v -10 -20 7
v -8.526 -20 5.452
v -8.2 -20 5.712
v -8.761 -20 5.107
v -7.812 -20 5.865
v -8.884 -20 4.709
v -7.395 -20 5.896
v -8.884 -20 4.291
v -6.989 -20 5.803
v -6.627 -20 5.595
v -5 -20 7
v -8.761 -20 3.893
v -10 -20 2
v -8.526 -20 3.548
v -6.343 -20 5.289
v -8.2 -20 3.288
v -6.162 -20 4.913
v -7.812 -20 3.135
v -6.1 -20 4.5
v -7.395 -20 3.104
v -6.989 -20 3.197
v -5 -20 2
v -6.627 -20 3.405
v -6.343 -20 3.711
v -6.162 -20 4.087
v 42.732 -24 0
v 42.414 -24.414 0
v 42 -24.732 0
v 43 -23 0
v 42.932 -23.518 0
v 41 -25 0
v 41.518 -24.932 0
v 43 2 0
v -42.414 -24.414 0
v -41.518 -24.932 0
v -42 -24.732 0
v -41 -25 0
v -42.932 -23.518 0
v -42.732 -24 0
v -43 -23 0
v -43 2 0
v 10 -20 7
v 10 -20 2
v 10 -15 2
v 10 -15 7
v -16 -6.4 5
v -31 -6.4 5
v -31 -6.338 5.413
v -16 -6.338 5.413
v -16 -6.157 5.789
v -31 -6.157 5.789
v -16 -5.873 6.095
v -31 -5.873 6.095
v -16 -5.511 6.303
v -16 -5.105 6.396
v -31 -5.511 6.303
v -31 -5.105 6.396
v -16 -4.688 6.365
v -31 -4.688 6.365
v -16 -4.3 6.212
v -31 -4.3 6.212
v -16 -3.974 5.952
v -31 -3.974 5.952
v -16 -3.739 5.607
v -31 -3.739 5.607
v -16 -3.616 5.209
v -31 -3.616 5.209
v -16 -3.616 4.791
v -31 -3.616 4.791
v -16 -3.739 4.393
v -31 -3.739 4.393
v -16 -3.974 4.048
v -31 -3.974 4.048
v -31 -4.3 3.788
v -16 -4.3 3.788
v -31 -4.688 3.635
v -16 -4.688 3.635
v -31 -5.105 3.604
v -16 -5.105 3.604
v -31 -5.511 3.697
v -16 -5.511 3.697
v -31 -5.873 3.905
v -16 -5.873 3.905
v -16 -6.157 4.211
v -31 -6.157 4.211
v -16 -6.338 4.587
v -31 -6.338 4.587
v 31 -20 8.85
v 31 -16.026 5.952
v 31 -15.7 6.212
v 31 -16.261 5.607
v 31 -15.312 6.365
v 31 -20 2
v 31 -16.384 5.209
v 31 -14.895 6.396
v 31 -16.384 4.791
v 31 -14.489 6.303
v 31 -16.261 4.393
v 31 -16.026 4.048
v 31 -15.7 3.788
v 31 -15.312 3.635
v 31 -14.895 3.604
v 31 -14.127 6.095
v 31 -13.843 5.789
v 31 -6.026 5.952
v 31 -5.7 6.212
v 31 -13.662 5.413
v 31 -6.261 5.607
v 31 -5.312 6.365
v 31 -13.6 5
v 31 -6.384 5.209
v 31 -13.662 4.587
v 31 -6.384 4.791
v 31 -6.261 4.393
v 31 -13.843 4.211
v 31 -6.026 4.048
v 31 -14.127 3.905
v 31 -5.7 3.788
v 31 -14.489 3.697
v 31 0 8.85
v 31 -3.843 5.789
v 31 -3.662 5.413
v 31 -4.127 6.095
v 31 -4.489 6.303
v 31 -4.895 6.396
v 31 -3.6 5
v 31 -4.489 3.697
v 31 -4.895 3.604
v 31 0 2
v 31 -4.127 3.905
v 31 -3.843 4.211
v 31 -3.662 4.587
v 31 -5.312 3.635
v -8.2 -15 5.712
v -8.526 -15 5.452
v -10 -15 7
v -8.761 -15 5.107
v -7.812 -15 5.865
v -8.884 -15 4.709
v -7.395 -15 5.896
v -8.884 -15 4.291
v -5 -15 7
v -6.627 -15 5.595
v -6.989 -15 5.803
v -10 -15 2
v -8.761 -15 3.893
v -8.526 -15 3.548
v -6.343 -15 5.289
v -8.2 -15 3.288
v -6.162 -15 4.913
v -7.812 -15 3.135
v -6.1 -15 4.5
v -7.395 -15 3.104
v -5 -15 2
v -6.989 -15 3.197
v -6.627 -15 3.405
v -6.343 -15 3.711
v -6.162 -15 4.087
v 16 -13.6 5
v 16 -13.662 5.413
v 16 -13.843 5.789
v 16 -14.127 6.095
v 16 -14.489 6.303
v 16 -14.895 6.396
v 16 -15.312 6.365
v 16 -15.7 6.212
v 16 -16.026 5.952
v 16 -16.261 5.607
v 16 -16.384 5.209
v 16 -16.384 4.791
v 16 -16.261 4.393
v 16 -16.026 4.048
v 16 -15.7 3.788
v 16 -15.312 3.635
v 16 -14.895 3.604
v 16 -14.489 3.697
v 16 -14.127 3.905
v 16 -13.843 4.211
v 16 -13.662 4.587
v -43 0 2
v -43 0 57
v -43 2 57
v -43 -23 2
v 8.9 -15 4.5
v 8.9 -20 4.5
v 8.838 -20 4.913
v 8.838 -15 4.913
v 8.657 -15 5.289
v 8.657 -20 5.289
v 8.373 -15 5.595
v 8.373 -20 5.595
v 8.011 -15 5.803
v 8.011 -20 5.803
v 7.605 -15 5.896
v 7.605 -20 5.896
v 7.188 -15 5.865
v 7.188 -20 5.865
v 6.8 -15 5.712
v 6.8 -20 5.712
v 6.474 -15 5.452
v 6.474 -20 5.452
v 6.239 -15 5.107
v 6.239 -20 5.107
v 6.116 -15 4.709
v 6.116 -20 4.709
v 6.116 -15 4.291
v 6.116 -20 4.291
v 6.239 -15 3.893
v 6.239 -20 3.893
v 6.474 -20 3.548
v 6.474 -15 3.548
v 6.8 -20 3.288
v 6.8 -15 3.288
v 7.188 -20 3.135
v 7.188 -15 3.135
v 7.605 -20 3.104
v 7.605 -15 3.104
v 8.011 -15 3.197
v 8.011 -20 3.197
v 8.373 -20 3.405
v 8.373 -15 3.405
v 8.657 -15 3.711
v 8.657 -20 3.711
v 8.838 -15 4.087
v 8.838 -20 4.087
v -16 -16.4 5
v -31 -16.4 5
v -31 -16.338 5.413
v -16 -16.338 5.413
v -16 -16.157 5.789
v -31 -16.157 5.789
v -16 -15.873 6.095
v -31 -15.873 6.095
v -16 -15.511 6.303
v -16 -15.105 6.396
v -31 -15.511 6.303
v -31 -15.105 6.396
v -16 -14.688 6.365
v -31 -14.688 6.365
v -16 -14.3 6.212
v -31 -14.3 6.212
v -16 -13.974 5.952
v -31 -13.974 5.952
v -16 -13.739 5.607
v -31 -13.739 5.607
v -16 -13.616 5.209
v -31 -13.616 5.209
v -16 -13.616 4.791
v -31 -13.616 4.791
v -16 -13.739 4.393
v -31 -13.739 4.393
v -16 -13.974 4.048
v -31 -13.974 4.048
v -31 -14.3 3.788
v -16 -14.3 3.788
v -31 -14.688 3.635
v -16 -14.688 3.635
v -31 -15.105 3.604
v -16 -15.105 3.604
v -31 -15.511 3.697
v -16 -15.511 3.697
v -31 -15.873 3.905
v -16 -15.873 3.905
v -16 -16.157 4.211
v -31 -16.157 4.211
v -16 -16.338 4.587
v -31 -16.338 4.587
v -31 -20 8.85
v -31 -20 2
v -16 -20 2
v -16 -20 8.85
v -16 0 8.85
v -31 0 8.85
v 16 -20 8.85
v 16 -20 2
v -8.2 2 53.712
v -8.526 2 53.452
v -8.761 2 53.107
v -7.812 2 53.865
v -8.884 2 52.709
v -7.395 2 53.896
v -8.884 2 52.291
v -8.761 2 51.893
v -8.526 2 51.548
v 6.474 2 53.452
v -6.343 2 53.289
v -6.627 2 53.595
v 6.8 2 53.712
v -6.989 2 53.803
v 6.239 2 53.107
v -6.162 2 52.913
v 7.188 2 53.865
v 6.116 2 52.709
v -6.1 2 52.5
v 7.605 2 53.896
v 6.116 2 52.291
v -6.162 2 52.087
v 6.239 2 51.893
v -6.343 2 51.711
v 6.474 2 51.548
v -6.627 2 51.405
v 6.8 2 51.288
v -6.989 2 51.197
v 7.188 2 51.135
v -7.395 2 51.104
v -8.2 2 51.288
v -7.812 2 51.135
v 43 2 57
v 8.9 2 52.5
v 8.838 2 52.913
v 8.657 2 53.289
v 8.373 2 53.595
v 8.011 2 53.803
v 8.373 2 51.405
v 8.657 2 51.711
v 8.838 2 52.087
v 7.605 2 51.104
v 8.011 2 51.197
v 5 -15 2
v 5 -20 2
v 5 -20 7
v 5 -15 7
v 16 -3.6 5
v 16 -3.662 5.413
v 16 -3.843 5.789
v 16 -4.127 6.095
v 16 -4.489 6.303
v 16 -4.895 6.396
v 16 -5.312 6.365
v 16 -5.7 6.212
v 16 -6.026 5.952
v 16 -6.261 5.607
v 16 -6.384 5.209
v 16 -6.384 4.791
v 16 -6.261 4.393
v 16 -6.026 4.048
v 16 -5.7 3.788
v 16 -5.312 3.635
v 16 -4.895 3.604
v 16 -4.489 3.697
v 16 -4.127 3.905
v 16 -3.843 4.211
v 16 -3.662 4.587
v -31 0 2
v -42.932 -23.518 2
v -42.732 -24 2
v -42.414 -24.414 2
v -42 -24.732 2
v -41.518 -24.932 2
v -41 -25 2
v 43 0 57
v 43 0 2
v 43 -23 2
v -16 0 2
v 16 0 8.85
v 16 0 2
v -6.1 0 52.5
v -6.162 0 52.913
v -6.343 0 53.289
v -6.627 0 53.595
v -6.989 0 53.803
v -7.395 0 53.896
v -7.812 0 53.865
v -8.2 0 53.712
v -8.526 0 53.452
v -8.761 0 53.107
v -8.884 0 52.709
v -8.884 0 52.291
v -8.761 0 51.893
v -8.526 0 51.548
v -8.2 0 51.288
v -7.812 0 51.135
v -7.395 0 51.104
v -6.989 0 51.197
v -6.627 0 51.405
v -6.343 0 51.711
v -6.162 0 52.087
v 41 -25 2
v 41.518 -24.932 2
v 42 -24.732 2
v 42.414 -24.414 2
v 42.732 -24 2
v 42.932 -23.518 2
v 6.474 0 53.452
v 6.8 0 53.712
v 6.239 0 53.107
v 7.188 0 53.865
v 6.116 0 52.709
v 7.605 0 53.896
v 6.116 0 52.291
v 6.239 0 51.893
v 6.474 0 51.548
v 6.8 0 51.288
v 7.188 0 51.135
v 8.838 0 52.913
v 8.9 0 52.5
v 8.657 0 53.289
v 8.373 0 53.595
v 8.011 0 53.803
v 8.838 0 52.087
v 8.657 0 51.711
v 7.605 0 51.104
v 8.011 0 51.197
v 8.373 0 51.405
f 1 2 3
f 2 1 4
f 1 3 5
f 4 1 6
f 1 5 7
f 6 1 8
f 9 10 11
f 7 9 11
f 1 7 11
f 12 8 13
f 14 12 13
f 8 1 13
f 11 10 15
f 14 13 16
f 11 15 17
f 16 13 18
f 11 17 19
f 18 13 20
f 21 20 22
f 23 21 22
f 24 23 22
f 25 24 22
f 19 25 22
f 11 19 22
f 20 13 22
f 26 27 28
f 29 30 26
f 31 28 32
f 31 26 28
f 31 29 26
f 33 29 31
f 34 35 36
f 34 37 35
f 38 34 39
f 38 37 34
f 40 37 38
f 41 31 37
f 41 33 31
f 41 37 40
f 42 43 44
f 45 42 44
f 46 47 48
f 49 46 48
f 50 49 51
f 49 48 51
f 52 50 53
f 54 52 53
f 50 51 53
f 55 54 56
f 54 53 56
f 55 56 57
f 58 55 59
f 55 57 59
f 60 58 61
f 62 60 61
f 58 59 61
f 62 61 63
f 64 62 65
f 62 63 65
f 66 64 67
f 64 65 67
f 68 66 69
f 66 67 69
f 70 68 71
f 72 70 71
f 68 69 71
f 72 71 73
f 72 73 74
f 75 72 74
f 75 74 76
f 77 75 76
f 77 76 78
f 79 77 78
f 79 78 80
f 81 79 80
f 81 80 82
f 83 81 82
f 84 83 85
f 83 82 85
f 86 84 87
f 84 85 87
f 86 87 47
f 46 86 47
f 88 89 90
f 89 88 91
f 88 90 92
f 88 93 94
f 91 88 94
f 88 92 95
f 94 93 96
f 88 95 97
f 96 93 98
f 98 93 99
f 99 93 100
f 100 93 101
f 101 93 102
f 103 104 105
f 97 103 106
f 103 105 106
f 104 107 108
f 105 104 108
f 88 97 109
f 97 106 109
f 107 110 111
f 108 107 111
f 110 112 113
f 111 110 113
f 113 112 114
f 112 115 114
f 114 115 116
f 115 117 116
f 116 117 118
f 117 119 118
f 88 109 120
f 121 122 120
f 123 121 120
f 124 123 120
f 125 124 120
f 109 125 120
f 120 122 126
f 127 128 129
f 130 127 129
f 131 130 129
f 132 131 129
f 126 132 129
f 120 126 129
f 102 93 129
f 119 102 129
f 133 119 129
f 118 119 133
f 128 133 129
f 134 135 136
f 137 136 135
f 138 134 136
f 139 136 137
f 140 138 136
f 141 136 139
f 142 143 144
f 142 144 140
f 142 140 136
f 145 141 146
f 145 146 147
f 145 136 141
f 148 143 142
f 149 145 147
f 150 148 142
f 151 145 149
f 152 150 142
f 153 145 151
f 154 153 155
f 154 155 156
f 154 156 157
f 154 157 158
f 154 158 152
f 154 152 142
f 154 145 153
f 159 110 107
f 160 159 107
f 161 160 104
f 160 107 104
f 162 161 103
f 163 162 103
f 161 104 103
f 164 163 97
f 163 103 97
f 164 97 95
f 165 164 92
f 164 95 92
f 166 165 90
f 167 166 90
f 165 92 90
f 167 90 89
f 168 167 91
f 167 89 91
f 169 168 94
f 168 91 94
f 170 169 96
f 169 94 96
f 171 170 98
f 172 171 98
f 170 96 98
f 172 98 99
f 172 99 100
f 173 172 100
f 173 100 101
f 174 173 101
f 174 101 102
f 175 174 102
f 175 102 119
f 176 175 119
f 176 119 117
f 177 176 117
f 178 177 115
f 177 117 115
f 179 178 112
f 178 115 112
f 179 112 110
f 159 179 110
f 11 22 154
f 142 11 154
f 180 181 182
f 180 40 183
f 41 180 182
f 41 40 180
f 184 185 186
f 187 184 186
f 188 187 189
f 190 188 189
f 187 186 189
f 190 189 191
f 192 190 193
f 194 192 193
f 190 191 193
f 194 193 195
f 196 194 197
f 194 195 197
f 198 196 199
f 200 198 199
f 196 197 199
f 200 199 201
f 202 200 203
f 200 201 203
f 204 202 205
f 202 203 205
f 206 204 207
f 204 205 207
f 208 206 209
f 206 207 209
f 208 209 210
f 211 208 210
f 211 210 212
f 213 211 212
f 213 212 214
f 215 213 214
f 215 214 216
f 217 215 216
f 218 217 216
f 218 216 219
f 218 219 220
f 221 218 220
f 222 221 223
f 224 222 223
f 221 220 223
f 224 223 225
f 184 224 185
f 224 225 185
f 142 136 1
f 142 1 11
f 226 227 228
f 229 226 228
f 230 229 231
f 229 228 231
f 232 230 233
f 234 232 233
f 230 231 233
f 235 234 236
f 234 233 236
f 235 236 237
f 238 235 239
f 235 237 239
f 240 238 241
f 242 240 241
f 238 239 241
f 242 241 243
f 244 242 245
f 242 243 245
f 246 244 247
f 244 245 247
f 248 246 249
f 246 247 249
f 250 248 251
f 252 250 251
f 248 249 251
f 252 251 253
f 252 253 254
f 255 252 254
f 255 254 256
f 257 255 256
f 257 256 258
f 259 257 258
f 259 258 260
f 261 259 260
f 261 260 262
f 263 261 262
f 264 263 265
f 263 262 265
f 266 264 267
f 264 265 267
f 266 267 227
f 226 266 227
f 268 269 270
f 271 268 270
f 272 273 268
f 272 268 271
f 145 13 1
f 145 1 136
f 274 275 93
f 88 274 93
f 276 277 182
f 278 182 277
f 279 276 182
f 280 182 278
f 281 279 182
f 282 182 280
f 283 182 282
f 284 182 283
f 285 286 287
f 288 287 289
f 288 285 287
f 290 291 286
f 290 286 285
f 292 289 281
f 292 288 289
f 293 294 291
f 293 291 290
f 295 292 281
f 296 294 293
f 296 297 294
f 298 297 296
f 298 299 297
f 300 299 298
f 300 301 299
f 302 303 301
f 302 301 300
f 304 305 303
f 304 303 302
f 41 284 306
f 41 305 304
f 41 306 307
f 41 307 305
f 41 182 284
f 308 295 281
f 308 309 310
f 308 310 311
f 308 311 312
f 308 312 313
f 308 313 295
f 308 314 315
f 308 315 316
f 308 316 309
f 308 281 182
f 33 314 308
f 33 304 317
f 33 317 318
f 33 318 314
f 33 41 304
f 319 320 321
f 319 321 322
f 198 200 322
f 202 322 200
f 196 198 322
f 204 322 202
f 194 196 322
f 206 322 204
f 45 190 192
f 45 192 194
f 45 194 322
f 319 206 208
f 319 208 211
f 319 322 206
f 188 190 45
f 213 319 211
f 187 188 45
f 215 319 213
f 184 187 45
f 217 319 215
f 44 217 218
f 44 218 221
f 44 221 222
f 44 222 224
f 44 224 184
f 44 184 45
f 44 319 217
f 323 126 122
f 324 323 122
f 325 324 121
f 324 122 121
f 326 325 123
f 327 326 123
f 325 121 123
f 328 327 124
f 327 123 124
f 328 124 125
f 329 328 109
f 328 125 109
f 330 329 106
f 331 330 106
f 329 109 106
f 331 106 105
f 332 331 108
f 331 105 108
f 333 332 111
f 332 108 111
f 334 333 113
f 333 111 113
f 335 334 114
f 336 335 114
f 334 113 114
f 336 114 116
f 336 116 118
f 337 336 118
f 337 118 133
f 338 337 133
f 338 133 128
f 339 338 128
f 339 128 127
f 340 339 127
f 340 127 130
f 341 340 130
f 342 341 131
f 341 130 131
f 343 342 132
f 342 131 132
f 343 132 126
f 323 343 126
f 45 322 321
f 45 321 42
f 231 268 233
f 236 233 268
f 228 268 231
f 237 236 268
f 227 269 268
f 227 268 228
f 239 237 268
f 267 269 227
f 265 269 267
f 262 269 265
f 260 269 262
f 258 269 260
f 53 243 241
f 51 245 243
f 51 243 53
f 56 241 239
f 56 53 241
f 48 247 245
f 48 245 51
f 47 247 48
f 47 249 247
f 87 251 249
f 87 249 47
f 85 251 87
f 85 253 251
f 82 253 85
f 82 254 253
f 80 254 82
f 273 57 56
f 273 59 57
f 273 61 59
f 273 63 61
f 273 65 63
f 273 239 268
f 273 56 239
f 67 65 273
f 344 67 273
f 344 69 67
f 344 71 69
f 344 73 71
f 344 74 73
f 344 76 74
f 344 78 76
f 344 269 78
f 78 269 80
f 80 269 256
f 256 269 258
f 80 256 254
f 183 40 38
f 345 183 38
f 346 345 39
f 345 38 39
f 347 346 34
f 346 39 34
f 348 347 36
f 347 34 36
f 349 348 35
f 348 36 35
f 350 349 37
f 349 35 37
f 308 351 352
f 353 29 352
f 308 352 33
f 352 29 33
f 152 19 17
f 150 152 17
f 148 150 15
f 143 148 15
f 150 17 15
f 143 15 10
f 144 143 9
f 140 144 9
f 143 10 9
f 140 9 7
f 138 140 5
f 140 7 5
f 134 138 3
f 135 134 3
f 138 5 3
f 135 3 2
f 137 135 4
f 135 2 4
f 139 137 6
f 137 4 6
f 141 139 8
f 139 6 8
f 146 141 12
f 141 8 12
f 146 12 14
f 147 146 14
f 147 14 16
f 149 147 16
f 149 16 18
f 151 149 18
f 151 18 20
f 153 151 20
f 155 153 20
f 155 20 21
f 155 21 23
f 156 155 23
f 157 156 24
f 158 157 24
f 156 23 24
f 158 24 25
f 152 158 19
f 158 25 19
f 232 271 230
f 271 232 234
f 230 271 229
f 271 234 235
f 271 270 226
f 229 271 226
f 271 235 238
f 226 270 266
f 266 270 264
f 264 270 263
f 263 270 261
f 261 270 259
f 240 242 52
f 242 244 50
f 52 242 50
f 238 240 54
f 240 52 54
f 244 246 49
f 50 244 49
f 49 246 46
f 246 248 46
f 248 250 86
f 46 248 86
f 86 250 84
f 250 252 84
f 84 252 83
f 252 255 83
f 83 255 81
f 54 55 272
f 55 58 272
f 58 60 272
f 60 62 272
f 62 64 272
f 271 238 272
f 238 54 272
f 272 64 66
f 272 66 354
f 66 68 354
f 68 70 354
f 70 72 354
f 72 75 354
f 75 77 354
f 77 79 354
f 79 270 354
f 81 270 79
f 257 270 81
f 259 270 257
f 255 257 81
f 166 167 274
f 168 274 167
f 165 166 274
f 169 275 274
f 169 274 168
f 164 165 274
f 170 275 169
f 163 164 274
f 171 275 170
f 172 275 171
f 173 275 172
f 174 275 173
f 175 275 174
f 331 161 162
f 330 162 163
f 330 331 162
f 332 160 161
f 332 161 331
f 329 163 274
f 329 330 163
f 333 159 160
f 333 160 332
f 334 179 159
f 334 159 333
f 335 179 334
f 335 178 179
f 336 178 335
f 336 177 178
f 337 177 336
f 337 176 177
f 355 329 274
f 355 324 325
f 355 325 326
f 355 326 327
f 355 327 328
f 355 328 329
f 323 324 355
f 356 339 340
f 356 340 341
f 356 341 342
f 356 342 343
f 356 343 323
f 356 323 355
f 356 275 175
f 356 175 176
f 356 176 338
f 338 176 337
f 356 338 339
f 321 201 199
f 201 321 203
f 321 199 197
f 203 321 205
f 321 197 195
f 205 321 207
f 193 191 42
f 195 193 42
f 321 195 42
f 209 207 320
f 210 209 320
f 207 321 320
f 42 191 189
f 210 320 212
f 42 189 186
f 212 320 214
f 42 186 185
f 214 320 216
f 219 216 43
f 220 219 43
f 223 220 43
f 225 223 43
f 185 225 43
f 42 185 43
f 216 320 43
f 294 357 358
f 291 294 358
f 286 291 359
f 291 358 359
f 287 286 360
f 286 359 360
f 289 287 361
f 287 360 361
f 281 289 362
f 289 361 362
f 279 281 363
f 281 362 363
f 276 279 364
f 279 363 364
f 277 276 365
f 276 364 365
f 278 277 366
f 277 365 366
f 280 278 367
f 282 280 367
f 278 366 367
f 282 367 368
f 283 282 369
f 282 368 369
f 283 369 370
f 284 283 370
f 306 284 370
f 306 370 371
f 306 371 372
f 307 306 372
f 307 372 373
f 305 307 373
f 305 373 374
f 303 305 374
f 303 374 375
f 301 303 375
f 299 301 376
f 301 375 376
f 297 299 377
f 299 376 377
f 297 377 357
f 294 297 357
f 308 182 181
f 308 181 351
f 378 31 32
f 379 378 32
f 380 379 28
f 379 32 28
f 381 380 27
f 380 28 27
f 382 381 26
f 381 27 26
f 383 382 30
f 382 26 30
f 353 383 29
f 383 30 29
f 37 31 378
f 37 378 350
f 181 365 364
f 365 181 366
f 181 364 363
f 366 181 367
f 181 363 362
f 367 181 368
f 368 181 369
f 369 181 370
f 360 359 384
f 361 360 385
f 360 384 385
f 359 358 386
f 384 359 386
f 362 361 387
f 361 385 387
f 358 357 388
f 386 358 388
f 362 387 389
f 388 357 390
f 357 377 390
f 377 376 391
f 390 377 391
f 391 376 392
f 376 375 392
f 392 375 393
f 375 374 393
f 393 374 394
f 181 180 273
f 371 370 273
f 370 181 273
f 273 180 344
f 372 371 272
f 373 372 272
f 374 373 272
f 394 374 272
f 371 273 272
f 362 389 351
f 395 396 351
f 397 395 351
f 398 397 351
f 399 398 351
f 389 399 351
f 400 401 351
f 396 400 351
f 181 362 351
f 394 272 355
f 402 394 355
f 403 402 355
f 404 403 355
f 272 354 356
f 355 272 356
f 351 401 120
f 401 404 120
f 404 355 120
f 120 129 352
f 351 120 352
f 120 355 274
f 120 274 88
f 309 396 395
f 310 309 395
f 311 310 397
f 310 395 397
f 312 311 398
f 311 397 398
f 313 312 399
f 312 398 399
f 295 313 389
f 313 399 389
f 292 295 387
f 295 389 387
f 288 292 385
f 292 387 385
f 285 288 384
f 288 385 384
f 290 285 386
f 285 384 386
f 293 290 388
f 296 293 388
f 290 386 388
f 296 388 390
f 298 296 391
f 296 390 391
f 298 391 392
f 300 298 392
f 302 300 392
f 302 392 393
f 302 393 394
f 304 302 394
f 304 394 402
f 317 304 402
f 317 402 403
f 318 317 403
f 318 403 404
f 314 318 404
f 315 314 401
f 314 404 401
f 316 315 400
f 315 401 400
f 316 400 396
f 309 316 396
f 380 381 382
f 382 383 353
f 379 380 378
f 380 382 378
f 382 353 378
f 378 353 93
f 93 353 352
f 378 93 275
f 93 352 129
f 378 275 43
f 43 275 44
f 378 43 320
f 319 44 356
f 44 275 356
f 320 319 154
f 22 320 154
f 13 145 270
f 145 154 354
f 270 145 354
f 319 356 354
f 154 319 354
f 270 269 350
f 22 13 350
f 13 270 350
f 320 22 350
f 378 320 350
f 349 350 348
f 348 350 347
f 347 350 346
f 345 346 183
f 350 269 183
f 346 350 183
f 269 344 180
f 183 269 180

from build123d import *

# Parameters (mm, degrees)
PAD_DEPTH       = 2
SKETCH010_W     = 86
SKETCH010_H     = 2
PAD001_DEPTH    = 55
SKETCH009_R     = 1.4
POCKET_DEPTH    = 2
SKETCH003_W     = 15
SKETCH003_H     = 20
PAD002_DEPTH    = 6.85
SKETCH004_R     = 1.4
POCKET001_DEPTH = 15
SKETCH005_R     = 1.4
POCKET002_DEPTH = 15
SKETCH006_W     = 5
SKETCH006_H     = 5
PAD003_DEPTH    = 5
SKETCH007_R     = 1.4
POCKET003_DEPTH = 5
SKETCH008_R     = 1.4
POCKET004_DEPTH = 5


with BuildPart() as part:
    # Sketch → Pad (new body)
    with BuildSketch(Plane.XY):
        with BuildLine():
            Line((-43, 2), (43, 2))
            Line((43, 2), (43, -23))
            ThreePointArc((41, -25), (42.414214, -24.414214), (43, -23))
            Line((41, -25), (-41, -25))
            ThreePointArc((-43, -23), (-42.414214, -24.414214), (-41, -25))
            Line((-43, -23), (-43, 2))
        make_face()
    extrude(amount=PAD_DEPTH)

    # Sketch010 (on Face8 of Pad) → Pad001 (join)
    with BuildSketch(Plane.XY.offset(2)):
        with Locations((0, 1)):
            Rectangle(SKETCH010_W, SKETCH010_H)
    extrude(amount=PAD001_DEPTH)

    # Sketch009 (on Face13 of Pad001) → Pocket (cut)
    with BuildSketch(Plane.XZ):
        with Locations((-7.5, 52.5)):
            Circle(SKETCH009_R)
        with Locations((7.5, 52.5)):
            Circle(SKETCH009_R)
    extrude(amount=-POCKET_DEPTH, mode=Mode.SUBTRACT)

    # Sketch003 (on Face7 of Pocket) → Pad002 (join)
    with BuildSketch(Plane.XY.offset(2)):
        with Locations((-23.5, -10)):
            Rectangle(SKETCH003_W, SKETCH003_H)
        with Locations((23.5, -10)):
            Rectangle(SKETCH003_W, SKETCH003_H)
    extrude(amount=PAD002_DEPTH)

    # Sketch004 (on Face16 of Pad002) → Pocket001 (cut)
    with BuildSketch(Plane(origin=(-31, 0, 0), x_dir=(0, -1, 0), z_dir=(-1, 0, 0))):
        with Locations((5, 5)):
            Circle(SKETCH004_R)
        with Locations((15, 5)):
            Circle(SKETCH004_R)
    extrude(amount=-POCKET001_DEPTH, mode=Mode.SUBTRACT)

    # Sketch005 (on Face21 of Pocket001) → Pocket002 (cut)
    with BuildSketch(Plane.YZ.offset(31)):
        with Locations((-15, 5)):
            Circle(SKETCH005_R)
        with Locations((-5, 5)):
            Circle(SKETCH005_R)
    extrude(amount=-POCKET002_DEPTH, mode=Mode.SUBTRACT)

    # Sketch006 (on Face7 of Pocket002) → Pad003 (join)
    with BuildSketch(Plane.XY.offset(2)):
        with Locations((-7.5, -17.5)):
            Rectangle(SKETCH006_W, SKETCH006_H)
        with Locations((7.5, -17.5)):
            Rectangle(SKETCH006_W, SKETCH006_H)
    extrude(amount=PAD003_DEPTH)

    # Sketch007 (on Face23 of Pad003) → Pocket003 (cut)
    with BuildSketch(Plane.XZ.offset(20)):
        with Locations((-7.5, 4.5)):
            Circle(SKETCH007_R)
    extrude(amount=-POCKET003_DEPTH, mode=Mode.SUBTRACT)

    # Sketch008 (on Face27 of Pocket003) → Pocket004 (cut)
    with BuildSketch(Plane.XZ.offset(20)):
        with Locations((7.5, 4.5)):
            Circle(SKETCH008_R)
    extrude(amount=-POCKET004_DEPTH, mode=Mode.SUBTRACT)


solid = part.part
